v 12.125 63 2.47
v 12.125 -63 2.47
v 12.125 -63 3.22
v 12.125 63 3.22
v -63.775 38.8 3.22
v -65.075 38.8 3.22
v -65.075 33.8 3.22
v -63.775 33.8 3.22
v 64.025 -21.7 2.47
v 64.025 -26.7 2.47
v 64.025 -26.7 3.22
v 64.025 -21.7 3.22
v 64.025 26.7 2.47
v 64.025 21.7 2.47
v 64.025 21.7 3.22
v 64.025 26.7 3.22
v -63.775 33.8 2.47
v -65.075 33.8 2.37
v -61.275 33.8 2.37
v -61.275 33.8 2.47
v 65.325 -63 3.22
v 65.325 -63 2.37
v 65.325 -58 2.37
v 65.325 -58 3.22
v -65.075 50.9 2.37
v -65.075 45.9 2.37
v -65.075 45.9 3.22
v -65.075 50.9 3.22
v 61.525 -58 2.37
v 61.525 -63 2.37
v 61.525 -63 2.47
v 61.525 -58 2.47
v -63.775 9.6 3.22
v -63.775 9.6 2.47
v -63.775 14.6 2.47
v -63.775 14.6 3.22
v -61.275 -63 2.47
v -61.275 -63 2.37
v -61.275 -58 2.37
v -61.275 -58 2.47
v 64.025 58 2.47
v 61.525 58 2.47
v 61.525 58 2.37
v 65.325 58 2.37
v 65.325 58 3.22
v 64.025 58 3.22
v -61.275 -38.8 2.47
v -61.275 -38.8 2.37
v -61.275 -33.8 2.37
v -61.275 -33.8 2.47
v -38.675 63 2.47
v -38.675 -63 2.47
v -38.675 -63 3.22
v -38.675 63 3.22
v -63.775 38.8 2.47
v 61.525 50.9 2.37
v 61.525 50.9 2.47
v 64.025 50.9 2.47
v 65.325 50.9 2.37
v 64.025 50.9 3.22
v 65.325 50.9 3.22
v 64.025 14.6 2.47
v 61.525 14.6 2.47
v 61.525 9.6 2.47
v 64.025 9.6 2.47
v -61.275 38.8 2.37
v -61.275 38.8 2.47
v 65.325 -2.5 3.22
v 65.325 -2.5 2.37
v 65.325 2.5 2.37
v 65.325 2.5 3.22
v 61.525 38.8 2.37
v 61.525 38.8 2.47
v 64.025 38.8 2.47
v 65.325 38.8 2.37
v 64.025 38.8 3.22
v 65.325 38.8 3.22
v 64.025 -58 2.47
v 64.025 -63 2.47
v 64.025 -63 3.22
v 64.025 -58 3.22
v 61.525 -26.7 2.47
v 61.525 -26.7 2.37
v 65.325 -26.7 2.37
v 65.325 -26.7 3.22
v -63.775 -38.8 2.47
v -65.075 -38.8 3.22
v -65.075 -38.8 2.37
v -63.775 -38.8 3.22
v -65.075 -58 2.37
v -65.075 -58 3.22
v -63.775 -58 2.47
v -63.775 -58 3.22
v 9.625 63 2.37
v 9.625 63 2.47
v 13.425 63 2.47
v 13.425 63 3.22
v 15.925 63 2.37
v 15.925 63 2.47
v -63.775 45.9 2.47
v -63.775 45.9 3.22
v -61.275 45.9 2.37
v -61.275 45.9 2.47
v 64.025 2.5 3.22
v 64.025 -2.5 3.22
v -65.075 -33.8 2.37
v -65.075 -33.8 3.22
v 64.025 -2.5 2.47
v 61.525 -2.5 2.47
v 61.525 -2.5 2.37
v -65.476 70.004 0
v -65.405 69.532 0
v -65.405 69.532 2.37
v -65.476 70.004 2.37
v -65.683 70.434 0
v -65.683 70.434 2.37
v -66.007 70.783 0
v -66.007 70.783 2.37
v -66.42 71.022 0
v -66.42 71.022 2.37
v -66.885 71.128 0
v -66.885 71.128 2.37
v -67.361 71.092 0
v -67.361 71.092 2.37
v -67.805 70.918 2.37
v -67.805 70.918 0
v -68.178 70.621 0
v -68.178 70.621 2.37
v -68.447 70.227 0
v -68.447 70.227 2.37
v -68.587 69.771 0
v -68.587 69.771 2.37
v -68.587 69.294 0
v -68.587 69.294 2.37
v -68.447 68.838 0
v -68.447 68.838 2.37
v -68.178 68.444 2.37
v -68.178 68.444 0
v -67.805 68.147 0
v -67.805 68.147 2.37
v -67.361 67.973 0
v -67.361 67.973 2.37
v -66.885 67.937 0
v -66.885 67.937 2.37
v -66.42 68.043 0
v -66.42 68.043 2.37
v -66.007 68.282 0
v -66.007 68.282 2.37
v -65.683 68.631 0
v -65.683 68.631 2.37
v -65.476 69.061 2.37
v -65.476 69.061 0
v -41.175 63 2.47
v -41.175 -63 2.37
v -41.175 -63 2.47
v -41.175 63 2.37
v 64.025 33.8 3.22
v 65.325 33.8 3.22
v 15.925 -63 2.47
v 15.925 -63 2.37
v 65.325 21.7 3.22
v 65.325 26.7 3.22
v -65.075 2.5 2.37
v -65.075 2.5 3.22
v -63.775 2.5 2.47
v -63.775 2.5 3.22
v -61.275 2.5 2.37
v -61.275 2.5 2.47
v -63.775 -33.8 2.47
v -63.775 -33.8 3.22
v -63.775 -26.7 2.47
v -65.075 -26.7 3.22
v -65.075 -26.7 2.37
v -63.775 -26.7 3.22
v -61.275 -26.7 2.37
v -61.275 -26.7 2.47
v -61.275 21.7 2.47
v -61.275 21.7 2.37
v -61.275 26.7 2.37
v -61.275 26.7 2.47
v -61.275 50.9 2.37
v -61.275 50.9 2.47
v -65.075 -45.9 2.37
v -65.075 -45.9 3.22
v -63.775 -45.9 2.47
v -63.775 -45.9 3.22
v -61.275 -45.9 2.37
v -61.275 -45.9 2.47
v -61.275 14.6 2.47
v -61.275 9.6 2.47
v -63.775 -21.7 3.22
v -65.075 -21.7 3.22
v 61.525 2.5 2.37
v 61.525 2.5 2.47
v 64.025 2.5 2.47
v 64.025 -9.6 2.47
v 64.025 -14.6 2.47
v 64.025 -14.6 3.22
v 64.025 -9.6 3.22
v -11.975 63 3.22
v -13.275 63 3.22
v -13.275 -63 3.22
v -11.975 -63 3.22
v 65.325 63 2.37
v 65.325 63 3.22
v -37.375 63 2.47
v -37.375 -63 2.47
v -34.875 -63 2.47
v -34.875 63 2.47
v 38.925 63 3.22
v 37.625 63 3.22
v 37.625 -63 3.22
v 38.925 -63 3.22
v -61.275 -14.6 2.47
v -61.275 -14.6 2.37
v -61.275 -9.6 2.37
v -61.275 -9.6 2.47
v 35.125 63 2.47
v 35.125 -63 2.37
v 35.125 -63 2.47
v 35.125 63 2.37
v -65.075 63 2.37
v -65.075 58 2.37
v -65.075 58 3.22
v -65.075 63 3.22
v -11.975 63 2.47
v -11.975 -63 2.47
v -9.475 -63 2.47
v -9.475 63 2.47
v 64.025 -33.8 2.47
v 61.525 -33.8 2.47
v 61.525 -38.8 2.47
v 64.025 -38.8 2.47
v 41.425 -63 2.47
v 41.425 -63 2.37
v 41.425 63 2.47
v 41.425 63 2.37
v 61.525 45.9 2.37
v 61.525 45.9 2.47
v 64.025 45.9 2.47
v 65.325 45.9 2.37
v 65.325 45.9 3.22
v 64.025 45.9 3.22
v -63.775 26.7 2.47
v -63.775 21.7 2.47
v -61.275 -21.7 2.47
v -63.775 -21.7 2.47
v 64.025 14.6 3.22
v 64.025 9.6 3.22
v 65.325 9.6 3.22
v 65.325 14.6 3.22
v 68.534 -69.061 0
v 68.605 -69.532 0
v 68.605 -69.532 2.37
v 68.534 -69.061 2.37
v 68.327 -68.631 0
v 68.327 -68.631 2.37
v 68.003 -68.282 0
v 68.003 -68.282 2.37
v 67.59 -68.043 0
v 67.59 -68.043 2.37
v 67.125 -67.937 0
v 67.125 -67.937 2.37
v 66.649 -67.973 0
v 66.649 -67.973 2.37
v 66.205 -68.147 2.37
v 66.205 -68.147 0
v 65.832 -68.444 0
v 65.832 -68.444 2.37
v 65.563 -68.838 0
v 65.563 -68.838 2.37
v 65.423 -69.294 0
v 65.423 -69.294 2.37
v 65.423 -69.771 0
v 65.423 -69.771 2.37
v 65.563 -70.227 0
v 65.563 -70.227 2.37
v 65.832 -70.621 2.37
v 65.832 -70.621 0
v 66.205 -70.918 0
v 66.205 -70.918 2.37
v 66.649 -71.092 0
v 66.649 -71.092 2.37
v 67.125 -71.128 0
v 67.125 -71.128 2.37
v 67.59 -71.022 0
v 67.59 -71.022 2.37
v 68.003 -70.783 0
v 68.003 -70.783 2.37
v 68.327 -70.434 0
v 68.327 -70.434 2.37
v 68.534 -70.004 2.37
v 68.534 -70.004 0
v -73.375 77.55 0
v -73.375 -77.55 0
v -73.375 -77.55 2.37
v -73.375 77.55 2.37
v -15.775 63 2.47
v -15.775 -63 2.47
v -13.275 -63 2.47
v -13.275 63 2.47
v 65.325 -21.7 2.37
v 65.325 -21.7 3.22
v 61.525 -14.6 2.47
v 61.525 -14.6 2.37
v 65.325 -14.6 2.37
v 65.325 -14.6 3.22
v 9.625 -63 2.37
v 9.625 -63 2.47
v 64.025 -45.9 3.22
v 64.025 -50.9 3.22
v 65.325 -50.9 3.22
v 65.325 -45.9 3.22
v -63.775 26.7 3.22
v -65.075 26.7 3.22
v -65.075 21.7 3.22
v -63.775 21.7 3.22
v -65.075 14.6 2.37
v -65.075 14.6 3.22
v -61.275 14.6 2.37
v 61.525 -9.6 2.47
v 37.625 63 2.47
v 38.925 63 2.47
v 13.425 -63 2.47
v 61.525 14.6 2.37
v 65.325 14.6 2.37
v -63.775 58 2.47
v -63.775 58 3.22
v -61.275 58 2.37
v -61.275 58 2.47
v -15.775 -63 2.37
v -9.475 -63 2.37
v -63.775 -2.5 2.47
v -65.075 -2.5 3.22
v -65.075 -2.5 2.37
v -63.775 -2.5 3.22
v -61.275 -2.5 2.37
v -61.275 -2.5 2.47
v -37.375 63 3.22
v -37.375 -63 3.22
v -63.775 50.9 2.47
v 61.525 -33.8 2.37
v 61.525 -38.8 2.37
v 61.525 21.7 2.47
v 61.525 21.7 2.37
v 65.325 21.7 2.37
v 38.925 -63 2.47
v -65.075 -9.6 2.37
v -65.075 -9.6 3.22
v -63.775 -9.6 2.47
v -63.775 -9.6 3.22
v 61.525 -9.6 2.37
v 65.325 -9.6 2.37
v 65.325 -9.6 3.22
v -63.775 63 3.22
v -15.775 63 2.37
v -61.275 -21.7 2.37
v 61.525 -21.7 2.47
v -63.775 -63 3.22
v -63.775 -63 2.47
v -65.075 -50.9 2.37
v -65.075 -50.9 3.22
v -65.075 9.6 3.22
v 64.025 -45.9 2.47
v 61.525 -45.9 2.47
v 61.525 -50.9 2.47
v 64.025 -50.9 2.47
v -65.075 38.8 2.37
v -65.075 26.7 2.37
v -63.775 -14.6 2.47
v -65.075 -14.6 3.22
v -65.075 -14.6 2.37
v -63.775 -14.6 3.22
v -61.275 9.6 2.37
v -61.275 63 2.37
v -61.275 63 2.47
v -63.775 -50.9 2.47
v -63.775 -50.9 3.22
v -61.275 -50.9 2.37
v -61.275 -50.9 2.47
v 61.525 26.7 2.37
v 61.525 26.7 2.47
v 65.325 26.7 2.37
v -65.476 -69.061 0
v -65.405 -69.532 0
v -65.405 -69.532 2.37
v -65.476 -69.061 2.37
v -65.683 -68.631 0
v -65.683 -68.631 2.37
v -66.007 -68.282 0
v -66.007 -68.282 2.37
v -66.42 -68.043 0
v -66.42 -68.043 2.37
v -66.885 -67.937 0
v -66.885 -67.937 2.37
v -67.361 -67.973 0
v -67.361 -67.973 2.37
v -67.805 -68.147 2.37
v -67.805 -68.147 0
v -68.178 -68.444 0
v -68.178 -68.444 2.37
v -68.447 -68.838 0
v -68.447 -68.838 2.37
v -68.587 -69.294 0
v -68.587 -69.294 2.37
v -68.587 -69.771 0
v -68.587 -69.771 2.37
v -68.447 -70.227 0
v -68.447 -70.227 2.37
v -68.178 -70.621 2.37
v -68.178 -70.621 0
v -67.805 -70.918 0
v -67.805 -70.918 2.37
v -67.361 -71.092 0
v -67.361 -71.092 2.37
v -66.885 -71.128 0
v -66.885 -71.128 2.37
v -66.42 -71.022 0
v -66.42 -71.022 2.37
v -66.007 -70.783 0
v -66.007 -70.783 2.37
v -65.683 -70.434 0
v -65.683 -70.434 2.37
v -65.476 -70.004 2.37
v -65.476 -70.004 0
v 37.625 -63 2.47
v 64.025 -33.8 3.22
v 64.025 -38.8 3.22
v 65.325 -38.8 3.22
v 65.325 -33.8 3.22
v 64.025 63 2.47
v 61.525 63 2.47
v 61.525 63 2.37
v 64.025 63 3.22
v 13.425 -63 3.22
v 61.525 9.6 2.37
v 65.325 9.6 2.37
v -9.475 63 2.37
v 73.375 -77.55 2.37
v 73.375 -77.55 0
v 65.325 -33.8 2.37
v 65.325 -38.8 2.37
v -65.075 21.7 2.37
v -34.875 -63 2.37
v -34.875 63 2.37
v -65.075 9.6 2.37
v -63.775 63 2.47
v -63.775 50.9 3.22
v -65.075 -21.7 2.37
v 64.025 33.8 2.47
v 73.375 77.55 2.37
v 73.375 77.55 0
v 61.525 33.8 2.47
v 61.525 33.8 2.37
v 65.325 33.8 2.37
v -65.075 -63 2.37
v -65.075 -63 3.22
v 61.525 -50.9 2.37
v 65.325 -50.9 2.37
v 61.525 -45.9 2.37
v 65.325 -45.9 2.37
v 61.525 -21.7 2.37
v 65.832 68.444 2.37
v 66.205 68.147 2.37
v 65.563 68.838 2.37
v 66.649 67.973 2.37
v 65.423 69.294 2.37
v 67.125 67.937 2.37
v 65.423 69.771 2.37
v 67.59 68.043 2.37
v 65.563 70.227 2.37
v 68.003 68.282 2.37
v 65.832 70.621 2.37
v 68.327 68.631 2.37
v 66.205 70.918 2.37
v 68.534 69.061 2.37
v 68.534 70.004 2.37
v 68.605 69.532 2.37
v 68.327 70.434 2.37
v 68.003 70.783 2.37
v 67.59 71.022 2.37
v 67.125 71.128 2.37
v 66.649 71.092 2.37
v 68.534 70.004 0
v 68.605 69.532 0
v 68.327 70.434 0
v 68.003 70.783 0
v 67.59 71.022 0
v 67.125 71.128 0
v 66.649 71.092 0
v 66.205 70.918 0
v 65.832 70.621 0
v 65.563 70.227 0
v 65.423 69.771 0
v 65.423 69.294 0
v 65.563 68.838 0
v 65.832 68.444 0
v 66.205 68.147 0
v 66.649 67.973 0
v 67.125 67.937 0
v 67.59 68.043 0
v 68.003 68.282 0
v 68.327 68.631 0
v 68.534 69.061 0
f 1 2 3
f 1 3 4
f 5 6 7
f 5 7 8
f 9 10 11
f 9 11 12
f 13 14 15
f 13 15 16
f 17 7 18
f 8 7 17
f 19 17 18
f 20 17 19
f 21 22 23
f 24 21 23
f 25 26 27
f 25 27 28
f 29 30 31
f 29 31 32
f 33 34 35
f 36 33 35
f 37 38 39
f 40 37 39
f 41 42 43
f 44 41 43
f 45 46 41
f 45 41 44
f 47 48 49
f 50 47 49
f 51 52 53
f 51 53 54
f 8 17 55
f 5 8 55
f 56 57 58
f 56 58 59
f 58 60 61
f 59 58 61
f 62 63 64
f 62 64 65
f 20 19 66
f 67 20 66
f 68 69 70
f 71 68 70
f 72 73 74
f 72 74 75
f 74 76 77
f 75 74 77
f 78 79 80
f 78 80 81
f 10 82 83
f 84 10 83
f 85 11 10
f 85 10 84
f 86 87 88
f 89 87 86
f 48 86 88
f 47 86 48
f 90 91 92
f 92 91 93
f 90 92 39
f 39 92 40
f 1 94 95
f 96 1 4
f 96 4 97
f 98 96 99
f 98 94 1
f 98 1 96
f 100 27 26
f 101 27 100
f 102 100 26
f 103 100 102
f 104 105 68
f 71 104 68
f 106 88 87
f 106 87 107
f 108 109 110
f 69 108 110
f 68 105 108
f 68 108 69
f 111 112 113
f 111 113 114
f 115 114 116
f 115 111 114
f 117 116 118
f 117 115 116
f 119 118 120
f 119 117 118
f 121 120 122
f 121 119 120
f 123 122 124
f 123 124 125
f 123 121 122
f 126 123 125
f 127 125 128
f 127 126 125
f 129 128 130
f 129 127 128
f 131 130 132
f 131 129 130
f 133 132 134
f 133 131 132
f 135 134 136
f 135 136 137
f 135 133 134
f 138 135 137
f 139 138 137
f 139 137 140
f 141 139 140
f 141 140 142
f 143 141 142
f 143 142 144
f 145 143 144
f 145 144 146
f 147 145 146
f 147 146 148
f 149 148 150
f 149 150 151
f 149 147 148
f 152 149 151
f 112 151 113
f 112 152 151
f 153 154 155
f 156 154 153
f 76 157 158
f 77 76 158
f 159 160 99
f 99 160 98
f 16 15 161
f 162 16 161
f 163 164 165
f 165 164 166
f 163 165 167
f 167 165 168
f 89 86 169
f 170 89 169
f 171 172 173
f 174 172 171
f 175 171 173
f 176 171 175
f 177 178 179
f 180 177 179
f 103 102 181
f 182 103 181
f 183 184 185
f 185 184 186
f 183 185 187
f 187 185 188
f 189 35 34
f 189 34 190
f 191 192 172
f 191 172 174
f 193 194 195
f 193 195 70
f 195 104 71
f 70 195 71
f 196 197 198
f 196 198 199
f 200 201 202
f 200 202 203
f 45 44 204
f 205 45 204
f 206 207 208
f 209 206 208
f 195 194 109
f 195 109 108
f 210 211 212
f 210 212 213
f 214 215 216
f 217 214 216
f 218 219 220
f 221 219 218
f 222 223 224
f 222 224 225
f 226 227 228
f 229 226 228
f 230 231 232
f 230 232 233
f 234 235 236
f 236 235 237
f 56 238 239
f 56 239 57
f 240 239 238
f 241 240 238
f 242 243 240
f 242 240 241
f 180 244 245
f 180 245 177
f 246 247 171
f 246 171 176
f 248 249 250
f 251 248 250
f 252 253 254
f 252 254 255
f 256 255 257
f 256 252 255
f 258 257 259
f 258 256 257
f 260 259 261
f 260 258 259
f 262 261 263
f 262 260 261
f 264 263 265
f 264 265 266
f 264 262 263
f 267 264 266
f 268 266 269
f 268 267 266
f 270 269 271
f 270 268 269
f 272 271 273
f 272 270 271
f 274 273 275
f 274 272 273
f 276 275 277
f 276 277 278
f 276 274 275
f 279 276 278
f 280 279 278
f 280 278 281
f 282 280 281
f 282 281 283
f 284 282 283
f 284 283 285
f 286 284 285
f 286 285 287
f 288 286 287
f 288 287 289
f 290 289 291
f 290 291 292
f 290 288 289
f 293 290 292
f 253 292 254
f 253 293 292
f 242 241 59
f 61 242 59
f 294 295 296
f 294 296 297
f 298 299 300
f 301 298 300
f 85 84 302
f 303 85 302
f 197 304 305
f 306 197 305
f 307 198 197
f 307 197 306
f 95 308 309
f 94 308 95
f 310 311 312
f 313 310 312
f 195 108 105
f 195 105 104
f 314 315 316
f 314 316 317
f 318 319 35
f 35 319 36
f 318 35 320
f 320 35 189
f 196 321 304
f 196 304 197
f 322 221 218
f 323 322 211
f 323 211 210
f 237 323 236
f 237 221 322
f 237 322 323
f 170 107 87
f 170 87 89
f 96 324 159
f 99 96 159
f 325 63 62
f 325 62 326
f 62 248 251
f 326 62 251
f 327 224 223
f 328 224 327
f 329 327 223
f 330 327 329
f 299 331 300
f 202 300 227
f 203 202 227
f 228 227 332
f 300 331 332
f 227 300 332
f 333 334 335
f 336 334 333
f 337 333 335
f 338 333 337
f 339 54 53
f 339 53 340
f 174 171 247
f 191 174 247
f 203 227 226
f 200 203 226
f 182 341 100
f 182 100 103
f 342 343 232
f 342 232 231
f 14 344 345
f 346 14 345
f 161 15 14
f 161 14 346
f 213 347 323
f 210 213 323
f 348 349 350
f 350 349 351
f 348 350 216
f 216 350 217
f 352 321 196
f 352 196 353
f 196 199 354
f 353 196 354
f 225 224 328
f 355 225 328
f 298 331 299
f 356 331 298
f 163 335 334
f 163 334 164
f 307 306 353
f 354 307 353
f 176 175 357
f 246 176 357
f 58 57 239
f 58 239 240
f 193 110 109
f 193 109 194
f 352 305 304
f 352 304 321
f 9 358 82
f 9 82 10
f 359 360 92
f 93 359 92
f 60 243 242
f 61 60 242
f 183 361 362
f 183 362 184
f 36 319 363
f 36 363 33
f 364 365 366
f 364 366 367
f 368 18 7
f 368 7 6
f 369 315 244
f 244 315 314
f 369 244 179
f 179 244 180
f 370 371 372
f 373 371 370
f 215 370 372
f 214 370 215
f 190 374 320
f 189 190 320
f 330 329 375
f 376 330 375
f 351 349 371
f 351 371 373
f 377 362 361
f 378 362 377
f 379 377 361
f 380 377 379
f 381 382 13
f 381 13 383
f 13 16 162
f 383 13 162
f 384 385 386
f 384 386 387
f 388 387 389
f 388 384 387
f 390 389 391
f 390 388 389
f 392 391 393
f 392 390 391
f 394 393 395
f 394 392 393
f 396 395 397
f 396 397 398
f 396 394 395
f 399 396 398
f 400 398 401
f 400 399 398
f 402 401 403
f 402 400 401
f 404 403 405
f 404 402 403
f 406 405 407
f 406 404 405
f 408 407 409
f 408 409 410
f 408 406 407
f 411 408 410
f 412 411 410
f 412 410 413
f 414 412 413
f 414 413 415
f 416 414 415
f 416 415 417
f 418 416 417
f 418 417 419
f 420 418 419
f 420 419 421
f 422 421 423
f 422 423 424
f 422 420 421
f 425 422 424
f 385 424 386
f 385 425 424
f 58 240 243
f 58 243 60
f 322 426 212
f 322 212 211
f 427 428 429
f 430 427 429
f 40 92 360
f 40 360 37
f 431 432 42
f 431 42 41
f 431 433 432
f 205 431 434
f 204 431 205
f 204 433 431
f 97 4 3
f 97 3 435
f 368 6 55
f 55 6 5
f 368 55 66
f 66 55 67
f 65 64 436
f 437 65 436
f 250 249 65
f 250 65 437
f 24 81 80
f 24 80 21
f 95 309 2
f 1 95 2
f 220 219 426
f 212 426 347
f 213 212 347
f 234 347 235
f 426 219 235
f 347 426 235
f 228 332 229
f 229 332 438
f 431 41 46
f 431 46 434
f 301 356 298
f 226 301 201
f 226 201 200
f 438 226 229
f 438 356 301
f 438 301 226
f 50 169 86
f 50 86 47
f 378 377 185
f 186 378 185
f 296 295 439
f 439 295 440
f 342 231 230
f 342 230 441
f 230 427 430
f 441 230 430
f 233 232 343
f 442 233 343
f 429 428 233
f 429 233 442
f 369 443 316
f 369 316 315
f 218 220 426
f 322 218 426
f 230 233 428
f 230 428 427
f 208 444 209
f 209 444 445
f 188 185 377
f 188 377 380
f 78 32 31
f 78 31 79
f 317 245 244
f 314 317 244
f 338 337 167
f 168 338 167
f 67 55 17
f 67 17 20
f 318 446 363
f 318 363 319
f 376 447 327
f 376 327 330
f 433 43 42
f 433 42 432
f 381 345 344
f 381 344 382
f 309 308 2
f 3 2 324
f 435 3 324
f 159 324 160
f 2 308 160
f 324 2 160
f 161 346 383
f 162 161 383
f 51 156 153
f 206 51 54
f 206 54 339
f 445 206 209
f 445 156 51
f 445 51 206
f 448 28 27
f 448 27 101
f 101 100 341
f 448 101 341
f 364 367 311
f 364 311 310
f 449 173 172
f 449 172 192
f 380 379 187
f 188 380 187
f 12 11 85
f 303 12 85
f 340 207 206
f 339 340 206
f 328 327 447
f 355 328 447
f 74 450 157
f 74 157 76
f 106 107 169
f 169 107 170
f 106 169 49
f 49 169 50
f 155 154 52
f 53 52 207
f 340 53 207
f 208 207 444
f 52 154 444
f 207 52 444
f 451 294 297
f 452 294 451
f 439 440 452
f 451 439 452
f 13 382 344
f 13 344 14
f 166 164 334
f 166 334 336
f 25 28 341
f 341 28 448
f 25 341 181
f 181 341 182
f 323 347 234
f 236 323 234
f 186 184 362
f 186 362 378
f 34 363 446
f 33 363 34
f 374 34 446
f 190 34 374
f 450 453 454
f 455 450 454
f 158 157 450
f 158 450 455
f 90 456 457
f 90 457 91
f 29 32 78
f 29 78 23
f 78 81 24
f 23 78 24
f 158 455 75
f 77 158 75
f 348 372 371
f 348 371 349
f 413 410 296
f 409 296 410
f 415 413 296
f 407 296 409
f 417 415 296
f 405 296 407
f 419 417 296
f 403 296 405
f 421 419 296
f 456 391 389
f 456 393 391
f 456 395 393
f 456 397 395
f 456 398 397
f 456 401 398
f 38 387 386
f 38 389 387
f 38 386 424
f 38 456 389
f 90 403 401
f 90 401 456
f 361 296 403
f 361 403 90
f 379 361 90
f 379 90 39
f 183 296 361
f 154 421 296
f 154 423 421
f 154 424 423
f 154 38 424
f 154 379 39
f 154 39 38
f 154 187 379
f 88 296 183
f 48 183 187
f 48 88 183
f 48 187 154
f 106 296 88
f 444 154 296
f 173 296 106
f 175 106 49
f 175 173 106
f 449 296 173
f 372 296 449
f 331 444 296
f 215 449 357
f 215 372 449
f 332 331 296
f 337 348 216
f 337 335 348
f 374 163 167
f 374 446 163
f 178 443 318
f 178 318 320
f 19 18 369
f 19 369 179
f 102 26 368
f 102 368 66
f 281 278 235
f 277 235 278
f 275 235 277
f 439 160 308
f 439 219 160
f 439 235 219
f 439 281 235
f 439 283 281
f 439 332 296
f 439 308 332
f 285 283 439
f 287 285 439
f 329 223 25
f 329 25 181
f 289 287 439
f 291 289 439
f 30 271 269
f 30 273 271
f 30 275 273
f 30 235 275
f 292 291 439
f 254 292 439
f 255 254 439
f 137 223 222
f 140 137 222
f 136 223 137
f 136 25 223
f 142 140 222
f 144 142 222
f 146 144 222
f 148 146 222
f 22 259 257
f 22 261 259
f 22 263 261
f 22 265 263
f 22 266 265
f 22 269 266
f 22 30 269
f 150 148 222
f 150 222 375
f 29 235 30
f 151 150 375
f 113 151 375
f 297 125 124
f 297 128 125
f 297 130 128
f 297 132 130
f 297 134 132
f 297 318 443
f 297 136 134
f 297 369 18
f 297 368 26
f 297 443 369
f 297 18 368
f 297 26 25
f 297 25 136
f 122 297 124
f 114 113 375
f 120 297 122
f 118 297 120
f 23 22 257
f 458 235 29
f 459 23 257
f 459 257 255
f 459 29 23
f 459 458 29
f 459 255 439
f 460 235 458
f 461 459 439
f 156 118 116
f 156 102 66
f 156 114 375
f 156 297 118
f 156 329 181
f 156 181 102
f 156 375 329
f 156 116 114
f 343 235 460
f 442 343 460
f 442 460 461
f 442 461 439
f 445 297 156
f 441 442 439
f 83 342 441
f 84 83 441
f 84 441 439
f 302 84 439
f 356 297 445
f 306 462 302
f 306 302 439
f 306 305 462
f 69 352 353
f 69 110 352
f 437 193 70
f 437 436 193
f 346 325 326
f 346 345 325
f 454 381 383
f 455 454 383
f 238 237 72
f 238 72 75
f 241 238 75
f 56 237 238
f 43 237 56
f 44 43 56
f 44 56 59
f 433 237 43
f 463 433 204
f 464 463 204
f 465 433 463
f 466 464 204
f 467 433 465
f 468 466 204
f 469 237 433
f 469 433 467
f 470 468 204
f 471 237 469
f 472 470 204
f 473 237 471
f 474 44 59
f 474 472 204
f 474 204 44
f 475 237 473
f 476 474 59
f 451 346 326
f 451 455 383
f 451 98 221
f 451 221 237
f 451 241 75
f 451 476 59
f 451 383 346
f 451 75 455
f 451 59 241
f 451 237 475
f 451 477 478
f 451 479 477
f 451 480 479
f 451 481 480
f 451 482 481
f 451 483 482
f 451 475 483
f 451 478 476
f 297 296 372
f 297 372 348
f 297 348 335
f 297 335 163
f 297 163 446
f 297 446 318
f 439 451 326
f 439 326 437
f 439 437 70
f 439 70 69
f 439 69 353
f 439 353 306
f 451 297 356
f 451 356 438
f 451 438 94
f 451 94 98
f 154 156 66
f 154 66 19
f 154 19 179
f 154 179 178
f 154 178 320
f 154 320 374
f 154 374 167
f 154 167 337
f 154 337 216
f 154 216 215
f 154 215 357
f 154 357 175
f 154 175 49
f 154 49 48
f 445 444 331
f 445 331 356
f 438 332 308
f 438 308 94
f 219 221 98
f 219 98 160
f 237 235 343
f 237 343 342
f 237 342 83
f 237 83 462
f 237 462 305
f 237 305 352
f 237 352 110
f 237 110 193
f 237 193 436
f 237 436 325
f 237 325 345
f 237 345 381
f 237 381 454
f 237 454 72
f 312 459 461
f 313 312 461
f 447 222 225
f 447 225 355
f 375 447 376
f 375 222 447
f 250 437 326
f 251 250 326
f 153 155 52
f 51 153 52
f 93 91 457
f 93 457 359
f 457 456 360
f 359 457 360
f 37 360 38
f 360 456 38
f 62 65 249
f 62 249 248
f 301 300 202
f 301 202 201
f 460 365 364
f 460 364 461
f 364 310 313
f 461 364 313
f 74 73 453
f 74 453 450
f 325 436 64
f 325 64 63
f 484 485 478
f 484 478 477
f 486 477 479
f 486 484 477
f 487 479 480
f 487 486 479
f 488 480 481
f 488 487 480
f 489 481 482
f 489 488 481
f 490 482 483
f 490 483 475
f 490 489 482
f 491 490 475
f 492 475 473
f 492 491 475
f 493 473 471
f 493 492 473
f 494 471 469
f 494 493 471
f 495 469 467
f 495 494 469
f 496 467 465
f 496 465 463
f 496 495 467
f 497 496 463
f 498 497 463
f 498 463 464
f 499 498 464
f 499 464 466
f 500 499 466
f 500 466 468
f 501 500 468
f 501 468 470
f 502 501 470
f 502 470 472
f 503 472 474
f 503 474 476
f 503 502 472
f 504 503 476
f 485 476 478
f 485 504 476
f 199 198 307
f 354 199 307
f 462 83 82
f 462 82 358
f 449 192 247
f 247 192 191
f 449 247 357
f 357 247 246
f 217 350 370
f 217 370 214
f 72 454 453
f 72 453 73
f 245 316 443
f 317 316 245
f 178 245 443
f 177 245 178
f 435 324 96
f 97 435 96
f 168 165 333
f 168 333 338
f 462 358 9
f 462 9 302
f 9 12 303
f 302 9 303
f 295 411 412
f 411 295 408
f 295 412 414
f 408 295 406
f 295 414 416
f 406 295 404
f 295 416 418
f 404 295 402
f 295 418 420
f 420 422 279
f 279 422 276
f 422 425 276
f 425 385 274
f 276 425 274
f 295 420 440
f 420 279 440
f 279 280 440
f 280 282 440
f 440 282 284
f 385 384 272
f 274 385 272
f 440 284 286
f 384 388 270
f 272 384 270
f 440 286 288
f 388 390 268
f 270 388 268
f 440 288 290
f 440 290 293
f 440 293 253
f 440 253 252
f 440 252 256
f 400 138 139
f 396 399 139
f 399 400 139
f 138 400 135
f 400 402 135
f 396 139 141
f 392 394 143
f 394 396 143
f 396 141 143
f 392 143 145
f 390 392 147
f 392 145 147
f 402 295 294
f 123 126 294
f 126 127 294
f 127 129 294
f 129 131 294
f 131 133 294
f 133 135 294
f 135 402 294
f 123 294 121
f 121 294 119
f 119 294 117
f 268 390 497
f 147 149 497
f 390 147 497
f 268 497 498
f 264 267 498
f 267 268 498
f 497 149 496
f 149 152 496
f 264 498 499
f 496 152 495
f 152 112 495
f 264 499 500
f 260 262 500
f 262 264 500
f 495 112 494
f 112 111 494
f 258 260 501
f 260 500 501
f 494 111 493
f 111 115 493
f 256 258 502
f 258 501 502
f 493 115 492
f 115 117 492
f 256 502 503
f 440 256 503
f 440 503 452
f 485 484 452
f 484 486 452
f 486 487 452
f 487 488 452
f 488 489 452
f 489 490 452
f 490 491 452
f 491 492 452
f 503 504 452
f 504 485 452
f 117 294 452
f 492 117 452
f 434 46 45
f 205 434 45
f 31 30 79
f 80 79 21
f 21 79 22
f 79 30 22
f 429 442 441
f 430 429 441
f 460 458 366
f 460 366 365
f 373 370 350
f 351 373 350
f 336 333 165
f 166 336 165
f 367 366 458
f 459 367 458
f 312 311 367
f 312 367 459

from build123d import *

# Parameters (mm, degrees)
F0_W     = 146.75
F0_H     = 155.1
F0_R     = 1.6
F1_DEPTH = 2.37
F2_W     = 1.3
F2_H     = 126
F3_DEPTH = 0.85
F4_W     = 2.5
F4_H     = 126
F5_DEPTH = 0.1
F6_W     = 8
F6_H     = 7.1
F7_DEPTH = 0.85


with BuildPart() as f1:
    # F0 (on Top) → F1 (new body)
    with BuildSketch(Plane.XY):
        Rectangle(F0_W, F0_H)
        with Locations((-67.005, -69.5325)):
            Circle(F0_R, mode=Mode.SUBTRACT)
        with Locations((67.005, -69.5325)):
            Circle(F0_R, mode=Mode.SUBTRACT)
        with Locations((-67.005, 69.5325)):
            Circle(F0_R, mode=Mode.SUBTRACT)
        with Locations((67.005, 69.5325)):
            Circle(F0_R, mode=Mode.SUBTRACT)
    extrude(amount=F1_DEPTH)

    # F2 (on face) → F3 (join)
    with BuildSketch(Plane.XY.offset(2.37)):
        with Locations((64.675, 0)):
            Rectangle(F2_W, F2_H)
        with Locations((38.275, 0)):
            Rectangle(F2_W, F2_H)
        with Locations((12.775, 0)):
            Rectangle(F2_W, F2_H)
        with Locations((-38.025, 0)):
            Rectangle(F2_W, F2_H)
        with Locations((-12.625, 0)):
            Rectangle(F2_W, F2_H)
        with Locations((-64.425, 0)):
            Rectangle(F2_W, F2_H)
    extrude(amount=F3_DEPTH)

    # F4 (on face) → F5 (join)
    with BuildSketch(Plane.XY.offset(2.37)):
        with Locations((-62.525, 0)):
            Rectangle(F4_W, F4_H)
        with Locations((-39.925, 0)):
            Rectangle(F4_W, F4_H)
        with Locations((-36.125, 0)):
            Rectangle(F4_W, F4_H)
        with Locations((-14.525, 0)):
            Rectangle(F4_W, F4_H)
        with Locations((-10.725, 0)):
            Rectangle(F4_W, F4_H)
        with Locations((10.875, 0)):
            Rectangle(F4_W, F4_H)
        with Locations((14.675, 0)):
            Rectangle(F4_W, F4_H)
        with Locations((36.375, 0)):
            Rectangle(F4_W, F4_H)
        with Locations((40.175, 0)):
            Rectangle(F4_W, F4_H)
        with Locations((62.775, 0)):
            Rectangle(F4_W, F4_H)
    extrude(amount=F5_DEPTH)

    # F6 (on face) → F7 (cut)
    with BuildSketch(Plane.XY.offset(3.22)):
        with Locations((-62.375, -54.45)):
            Rectangle(F6_W, F6_H)
        with Locations((-62.375, -42.35)):
            Rectangle(F6_W, F6_H)
        with Locations((-62.375, -30.25)):
            Rectangle(F6_W, F6_H)
        with Locations((-62.375, -18.15)):
            Rectangle(F6_W, F6_H)
        with Locations((-62.375, -6.05)):
            Rectangle(F6_W, F6_H)
        with Locations((-62.375, 6.05)):
            Rectangle(F6_W, F6_H)
        with Locations((-62.375, 18.15)):
            Rectangle(F6_W, F6_H)
        with Locations((-62.375, 30.25)):
            Rectangle(F6_W, F6_H)
        with Locations((-62.375, 42.35)):
            Rectangle(F6_W, F6_H)
        with Locations((-62.375, 54.45)):
            Rectangle(F6_W, F6_H)
        with Locations((63.375, -54.45)):
            Rectangle(F6_W, F6_H)
        with Locations((63.375, -42.35)):
            Rectangle(F6_W, F6_H)
        with Locations((63.375, -30.25)):
            Rectangle(F6_W, F6_H)
        with Locations((63.375, -18.15)):
            Rectangle(F6_W, F6_H)
        with Locations((63.375, -6.05)):
            Rectangle(F6_W, F6_H)
        with Locations((63.375, 6.05)):
            Rectangle(F6_W, F6_H)
        with Locations((63.375, 18.15)):
            Rectangle(F6_W, F6_H)
        with Locations((63.375, 30.25)):
            Rectangle(F6_W, F6_H)
        with Locations((63.375, 42.35)):
            Rectangle(F6_W, F6_H)
        with Locations((63.375, 54.45)):
            Rectangle(F6_W, F6_H)
    extrude(amount=-F7_DEPTH, mode=Mode.SUBTRACT)


solid = f1.part
